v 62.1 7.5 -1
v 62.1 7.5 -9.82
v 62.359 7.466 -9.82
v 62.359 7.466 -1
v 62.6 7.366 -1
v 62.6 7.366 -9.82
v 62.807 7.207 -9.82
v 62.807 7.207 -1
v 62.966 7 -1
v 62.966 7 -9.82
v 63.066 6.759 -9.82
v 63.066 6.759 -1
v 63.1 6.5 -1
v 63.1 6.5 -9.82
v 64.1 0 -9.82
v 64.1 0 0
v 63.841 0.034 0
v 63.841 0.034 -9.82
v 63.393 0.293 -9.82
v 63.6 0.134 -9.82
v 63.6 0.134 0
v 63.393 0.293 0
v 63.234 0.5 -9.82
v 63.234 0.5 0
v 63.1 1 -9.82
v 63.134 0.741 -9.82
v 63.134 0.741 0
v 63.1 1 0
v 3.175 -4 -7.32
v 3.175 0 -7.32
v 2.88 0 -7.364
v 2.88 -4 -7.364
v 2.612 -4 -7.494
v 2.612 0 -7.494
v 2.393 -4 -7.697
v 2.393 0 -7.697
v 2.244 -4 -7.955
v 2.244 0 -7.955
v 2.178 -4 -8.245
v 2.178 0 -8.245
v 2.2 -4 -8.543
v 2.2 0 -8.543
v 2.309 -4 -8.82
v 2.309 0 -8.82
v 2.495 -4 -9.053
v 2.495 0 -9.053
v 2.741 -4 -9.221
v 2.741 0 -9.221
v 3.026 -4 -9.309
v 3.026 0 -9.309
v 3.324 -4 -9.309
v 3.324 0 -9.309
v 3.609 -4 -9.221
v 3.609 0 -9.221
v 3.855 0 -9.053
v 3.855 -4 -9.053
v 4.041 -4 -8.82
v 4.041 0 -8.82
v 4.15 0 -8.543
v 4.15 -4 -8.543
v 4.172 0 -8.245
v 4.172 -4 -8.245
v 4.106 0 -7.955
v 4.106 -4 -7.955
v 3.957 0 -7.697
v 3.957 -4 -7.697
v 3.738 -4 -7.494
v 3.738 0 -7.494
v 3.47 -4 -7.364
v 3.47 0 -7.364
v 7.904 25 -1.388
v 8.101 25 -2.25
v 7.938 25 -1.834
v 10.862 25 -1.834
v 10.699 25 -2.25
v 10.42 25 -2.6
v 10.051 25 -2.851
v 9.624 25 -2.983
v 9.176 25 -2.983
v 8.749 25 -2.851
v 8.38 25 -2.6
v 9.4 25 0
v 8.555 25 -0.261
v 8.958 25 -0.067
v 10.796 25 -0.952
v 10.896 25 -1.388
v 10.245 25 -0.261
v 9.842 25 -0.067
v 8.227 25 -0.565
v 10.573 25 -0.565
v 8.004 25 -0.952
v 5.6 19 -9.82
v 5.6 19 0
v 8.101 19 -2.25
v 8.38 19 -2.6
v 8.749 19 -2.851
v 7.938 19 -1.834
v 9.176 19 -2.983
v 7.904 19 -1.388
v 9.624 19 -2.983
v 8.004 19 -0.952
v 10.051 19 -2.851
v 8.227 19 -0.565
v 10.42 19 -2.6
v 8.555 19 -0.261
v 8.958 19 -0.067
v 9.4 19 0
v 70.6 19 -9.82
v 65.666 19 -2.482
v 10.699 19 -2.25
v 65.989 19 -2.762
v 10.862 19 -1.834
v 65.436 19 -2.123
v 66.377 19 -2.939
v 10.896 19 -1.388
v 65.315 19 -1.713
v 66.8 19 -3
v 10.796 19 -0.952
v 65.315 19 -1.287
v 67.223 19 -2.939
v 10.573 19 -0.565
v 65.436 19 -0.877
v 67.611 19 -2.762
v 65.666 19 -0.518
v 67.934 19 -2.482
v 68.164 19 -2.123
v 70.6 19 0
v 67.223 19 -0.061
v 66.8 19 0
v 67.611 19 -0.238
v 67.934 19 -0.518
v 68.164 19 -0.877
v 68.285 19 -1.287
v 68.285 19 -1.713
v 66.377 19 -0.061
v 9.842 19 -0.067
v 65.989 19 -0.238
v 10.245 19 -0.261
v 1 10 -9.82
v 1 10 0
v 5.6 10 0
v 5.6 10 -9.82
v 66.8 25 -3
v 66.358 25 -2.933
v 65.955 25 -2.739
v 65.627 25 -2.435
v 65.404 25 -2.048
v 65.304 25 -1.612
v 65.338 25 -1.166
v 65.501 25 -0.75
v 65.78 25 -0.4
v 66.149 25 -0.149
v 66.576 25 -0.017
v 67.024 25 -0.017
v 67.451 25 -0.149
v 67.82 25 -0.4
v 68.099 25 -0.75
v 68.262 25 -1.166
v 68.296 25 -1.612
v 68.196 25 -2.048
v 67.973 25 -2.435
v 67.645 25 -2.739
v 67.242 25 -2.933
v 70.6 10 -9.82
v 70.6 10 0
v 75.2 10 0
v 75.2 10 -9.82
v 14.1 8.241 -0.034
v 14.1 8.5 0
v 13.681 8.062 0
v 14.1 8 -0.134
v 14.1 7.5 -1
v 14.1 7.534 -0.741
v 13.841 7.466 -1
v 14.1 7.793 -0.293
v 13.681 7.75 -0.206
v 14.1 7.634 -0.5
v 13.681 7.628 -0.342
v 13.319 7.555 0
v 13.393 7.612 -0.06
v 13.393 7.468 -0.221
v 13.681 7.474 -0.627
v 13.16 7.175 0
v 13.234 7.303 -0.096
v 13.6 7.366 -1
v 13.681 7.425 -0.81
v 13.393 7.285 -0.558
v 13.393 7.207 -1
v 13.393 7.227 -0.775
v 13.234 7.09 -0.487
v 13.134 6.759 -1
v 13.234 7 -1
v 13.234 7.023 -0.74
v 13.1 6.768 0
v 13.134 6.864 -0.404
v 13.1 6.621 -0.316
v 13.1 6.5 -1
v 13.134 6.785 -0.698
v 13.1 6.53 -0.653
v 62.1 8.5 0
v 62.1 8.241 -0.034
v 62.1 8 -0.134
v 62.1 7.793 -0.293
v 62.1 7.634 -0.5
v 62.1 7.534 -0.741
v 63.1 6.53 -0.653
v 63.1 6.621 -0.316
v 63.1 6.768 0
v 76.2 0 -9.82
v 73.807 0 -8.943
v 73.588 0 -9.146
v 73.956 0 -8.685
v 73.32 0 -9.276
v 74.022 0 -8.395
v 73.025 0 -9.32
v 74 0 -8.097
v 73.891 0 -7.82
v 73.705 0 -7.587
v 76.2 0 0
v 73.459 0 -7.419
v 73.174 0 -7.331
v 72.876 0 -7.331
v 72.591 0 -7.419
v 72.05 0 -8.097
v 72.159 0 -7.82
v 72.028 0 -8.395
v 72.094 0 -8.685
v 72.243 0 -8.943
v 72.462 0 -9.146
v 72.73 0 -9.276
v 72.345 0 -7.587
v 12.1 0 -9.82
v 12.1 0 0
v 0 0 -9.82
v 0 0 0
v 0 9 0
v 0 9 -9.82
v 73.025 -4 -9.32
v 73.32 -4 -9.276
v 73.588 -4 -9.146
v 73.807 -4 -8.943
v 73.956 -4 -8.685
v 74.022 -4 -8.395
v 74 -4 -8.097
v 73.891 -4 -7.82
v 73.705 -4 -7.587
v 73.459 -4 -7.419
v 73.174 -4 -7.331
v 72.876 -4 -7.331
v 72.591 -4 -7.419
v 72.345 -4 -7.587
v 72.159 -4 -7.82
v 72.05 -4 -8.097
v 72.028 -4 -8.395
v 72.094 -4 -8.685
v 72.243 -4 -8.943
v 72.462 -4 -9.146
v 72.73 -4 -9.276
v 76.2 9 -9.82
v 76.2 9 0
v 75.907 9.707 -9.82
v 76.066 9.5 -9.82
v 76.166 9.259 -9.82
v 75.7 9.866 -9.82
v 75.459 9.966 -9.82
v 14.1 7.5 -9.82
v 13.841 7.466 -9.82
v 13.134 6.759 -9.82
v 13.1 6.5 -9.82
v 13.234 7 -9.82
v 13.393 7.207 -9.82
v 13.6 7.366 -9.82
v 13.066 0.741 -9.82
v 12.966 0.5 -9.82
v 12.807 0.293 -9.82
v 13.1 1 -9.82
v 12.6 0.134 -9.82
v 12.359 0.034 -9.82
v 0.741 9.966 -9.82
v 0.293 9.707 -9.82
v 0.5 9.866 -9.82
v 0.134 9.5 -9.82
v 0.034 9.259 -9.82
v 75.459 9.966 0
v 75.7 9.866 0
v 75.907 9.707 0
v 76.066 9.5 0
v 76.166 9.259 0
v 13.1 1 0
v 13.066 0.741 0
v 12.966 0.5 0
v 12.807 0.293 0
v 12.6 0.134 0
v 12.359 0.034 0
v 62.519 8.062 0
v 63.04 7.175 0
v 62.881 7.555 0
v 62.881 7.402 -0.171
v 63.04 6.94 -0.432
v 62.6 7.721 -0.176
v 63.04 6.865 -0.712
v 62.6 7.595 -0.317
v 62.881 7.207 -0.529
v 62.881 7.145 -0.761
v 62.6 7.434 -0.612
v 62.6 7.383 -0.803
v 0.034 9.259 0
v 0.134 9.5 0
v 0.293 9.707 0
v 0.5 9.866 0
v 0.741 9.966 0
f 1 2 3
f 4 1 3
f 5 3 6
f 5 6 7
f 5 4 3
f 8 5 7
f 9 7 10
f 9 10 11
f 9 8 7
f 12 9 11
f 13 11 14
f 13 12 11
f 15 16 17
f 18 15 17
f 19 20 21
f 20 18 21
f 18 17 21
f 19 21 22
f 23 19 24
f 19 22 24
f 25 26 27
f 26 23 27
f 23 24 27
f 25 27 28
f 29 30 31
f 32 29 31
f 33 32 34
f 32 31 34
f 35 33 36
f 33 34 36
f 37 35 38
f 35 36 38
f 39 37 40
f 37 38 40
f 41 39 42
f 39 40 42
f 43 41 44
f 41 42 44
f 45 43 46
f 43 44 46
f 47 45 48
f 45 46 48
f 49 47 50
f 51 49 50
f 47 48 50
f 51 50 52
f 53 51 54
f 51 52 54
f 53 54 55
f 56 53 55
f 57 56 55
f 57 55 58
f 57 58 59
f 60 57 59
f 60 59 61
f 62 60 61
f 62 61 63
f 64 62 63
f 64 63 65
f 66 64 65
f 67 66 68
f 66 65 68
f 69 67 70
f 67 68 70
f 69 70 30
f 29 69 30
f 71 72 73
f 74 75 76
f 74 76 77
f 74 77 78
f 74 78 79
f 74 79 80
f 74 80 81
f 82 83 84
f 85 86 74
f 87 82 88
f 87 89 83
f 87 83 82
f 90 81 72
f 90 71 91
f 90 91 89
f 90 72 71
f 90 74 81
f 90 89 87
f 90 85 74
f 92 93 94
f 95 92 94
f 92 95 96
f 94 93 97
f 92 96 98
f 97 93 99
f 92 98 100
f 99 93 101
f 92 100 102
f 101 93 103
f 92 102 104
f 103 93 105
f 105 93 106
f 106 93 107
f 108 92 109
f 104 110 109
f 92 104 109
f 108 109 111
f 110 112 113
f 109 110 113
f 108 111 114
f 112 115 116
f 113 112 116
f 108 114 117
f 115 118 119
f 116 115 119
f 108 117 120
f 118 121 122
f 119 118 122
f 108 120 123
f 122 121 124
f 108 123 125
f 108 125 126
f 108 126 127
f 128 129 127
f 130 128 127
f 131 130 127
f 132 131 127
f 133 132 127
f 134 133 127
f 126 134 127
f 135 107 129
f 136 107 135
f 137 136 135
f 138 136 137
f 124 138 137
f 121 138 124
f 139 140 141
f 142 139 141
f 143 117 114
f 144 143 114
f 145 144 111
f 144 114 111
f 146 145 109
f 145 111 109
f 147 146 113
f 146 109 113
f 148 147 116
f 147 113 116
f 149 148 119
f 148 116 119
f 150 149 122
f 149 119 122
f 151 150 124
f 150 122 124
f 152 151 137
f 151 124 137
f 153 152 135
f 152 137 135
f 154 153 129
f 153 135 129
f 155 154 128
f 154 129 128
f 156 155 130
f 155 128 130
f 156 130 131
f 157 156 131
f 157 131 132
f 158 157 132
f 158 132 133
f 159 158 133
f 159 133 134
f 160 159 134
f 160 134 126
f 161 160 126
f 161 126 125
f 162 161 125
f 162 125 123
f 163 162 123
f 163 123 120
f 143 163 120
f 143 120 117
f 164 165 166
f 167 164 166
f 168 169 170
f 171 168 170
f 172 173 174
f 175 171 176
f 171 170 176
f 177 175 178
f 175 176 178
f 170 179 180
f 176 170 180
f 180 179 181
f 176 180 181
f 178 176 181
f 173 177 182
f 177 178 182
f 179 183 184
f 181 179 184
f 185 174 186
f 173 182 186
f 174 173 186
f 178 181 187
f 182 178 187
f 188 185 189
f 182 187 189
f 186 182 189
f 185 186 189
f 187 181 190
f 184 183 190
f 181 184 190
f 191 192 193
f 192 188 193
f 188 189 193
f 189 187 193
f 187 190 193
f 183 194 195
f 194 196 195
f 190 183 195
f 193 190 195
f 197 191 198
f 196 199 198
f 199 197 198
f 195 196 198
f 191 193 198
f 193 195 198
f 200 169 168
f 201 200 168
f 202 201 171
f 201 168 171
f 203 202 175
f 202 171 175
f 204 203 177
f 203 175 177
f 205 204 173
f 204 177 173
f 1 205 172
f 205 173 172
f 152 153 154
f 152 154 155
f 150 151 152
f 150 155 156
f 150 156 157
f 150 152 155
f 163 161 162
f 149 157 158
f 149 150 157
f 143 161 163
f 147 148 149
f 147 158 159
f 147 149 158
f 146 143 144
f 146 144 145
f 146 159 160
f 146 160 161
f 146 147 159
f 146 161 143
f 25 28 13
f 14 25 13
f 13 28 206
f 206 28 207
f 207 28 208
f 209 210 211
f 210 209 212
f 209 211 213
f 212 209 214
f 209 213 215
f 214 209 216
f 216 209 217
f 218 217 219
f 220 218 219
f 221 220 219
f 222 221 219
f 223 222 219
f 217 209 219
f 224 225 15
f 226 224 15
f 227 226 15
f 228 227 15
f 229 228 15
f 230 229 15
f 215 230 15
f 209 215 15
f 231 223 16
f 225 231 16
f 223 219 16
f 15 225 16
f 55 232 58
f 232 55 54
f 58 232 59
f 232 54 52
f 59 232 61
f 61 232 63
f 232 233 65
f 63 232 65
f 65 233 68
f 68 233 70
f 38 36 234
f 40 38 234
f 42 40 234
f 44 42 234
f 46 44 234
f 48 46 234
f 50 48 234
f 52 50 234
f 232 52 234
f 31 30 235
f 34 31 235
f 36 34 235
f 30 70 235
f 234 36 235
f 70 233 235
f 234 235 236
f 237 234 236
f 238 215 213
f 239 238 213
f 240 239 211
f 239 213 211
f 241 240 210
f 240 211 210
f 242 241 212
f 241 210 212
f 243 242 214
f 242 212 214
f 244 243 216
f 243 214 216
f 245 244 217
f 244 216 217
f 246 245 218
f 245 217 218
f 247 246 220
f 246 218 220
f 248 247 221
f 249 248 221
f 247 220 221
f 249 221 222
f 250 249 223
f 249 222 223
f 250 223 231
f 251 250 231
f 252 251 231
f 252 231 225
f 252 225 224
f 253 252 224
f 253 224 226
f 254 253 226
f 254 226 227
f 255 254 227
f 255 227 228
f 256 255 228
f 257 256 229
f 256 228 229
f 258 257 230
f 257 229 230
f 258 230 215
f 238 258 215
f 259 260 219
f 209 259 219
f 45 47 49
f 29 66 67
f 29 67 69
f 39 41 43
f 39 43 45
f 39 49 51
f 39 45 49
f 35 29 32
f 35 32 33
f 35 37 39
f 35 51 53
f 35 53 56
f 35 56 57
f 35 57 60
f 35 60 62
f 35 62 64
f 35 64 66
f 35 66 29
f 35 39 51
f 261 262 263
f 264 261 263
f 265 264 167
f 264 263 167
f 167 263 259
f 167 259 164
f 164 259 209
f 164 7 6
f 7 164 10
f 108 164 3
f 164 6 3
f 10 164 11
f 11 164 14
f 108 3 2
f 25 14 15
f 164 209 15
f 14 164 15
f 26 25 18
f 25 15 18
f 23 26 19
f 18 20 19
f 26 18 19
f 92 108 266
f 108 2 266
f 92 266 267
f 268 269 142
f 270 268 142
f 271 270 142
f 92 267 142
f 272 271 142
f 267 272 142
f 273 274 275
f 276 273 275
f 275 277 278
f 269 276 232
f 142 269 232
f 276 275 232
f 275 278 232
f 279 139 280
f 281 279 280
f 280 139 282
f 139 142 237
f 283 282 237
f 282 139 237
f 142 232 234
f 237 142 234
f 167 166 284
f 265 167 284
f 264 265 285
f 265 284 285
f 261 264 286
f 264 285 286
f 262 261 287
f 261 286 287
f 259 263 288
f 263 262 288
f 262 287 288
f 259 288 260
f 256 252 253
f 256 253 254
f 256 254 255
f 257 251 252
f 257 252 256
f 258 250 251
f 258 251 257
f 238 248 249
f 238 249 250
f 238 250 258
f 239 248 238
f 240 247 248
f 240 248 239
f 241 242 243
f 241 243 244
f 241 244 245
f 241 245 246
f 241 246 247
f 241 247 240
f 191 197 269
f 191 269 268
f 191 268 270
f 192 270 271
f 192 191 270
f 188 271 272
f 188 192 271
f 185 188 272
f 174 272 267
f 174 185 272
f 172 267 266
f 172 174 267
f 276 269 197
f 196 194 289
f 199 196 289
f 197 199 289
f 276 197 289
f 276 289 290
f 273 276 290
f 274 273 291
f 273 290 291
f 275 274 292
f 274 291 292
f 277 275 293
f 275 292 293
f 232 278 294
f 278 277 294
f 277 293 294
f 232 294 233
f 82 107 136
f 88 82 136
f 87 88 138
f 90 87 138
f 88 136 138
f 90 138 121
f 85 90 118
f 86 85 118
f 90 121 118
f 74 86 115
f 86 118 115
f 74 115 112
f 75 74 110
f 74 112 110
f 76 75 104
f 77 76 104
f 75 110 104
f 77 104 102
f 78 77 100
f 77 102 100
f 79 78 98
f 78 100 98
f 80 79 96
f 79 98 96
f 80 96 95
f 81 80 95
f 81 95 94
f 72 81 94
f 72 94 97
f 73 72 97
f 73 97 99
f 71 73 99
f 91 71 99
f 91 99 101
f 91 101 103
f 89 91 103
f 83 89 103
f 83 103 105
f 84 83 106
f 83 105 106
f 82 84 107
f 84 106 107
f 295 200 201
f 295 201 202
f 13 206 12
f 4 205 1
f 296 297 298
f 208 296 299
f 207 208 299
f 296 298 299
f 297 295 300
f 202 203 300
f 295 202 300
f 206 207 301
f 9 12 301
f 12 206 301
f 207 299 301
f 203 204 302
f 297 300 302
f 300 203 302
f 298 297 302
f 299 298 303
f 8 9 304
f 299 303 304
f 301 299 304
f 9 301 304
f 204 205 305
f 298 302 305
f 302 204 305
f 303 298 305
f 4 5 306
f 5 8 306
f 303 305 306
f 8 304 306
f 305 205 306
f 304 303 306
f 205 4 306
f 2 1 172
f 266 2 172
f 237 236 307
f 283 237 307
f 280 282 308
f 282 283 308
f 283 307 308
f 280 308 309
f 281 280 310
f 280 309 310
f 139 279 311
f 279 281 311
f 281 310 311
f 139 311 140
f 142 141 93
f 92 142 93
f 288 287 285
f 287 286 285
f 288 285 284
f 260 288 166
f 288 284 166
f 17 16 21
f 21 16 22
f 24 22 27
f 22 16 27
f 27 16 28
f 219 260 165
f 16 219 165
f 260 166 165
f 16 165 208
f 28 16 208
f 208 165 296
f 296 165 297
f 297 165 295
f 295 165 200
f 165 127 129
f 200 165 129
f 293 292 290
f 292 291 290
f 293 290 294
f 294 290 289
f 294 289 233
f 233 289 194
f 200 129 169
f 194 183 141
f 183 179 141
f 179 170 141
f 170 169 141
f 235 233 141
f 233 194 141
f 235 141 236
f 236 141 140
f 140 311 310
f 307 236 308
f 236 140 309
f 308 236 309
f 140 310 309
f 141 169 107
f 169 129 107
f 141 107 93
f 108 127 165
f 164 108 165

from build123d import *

# Parameters (mm, degrees)
BOSS_EXTRUDE1_DEPTH = 9.82
SKETCH3_R           = 1.5
BOSS_EXTRUDE2_DEPTH = 6
SKETCH5_R           = 1
BOSS_EXTRUDE3_DEPTH = 4
FILLET1_R           = 1
FILLET3_R           = 1


with BuildPart() as part:
    # Sketch2 → Boss-Extrude1 (new body)
    with BuildSketch(Plane.XY):
        Polygon((0, 10), (5.6, 10), (5.6, 19), (70.6, 19), (70.6, 10), (76.2, 10), (76.2, 0), (63.1, 0), (63.1, 7.5), (13.1, 7.5), (13.1, 0), (0, 0), align=None)
    extrude(amount=-BOSS_EXTRUDE1_DEPTH)

    # Sketch3 → Boss-Extrude2 (add)
    with BuildSketch(Plane(origin=(0, 19, 0), x_dir=(1, 0, 0), z_dir=(0, 1, 0))):
        with Locations(Location((9.4, 1.5, 0), (0, 0, 270))):
            Circle(SKETCH3_R)
        with Locations(Location((66.8, 1.5, 0), (0, 0, 90))):
            Circle(SKETCH3_R)
    extrude(amount=BOSS_EXTRUDE2_DEPTH)

    # Sketch5 → Boss-Extrude3 (add)
    with BuildSketch(Plane.XZ):
        with Locations(Location((73.025, -8.32, 0), (0, 0, 270))):
            Circle(SKETCH5_R)
        with Locations(Location((3.175, -8.32, 0), (0, 0, 90))):
            Circle(SKETCH5_R)
    extrude(amount=BOSS_EXTRUDE3_DEPTH)

    # Fillet1
    fillet1_edges = [part.edges().sort_by_distance(p)[0] for p in [
        (38.1, 7.5, 0),
    ]]
    fillet(fillet1_edges, radius=FILLET1_R)

    # Fillet3
    # the kernel refuses this fillet: 1 mm, written as the material it adds along each edge
    with BuildSketch(Plane(origin=(63.1, 7.5, -1), x_dir=(-1, 0, 0), z_dir=(0, 0, -1))) as fillet3_piece_1:
        with BuildLine():
            CenterArc((FILLET3_R, -FILLET3_R), FILLET3_R, 90, 90)
            Line((0, -FILLET3_R), (0, 0))
            Line((0, 0), (FILLET3_R, 0))
        make_face()
    extrude(amount=8.82)
    with BuildSketch(Plane(origin=(13.1, 7.5, -1), x_dir=(1, 0, 0), z_dir=(0, 0, -1))) as fillet3_piece_2:
        with BuildLine():
            CenterArc((FILLET3_R, FILLET3_R), FILLET3_R, 180, 90)
            Line((0, FILLET3_R), (0, 0))
            Line((0, 0), (FILLET3_R, 0))
        make_face()
    extrude(amount=8.82)
    with BuildSketch(Plane(origin=(63.1, 8.5, -1), x_dir=(0, 0.5976672776328268, -0.8017442392976488), z_dir=(0, -0.8017442392976488, -0.5976672776328268))) as fillet3_piece_3_section:
        with BuildLine():
            CenterArc((1 + FILLET3_R, -FILLET3_R), FILLET3_R, 90, 90)
            Line((1 + FILLET3_R, 0), (1, 0))
            Line((1, 0), (1, -FILLET3_R))
        make_face()
    fillet3_piece_3 = revolve(axis=Axis((63.1, 8.5, -1), (1, 0, 0)), revolution_arc=233.296989237, mode=Mode.PRIVATE)
    fillet3_piece_3 = split(fillet3_piece_3, bisect_by=Plane(origin=(62.788371694, 7.750061053, 0), z_dir=(0, 0, -1)), keep=Keep.TOP, mode=Mode.PRIVATE)
    add(fillet3_piece_3)
    with BuildSketch(Plane(origin=(13.1, 8.5, -1), x_dir=(0, 0.5976672776328246, -0.8017442392976504), z_dir=(0, -0.8017442392976504, -0.5976672776328246))) as fillet3_piece_4_section:
        with BuildLine():
            CenterArc((1 + FILLET3_R, FILLET3_R), FILLET3_R, 180, 90)
            Line((1, FILLET3_R), (1, 0))
            Line((1, 0), (1 + FILLET3_R, 0))
        make_face()
    fillet3_piece_4 = revolve(axis=Axis((13.1, 8.5, -1), (1, 0, 0)), revolution_arc=233.296989237, mode=Mode.PRIVATE)
    fillet3_piece_4 = split(fillet3_piece_4, bisect_by=Plane(origin=(13.411628296, 7.750061029, 0), z_dir=(0, 0, -1)), keep=Keep.TOP, mode=Mode.PRIVATE)
    add(fillet3_piece_4)
    # the kernel refuses this fillet: 1 mm, written as the material it takes off along each edge
    with BuildSketch(Plane(origin=(63.1, 0, 2.5), x_dir=(0, 1, 0), z_dir=(0, 0, -1)), Plane(origin=(13.1, 0, 2.5), x_dir=(-1, 0, 0), z_dir=(0, 0, -1)), Plane(origin=(0, 10, 2.5), x_dir=(1, 0, 0), z_dir=(0, 0, -1)), Plane(origin=(76.2, 10, 2.5), x_dir=(0, -1, 0), z_dir=(0, 0, -1))) as fillet3_2_piece_1:
        with BuildLine():
            CenterArc((FILLET3_R, FILLET3_R), FILLET3_R, 180, 90)
            Line((0, FILLET3_R), (0, 0))
            Line((0, 0), (FILLET3_R, 0))
        make_face()
    extrude(amount=14.82, mode=Mode.SUBTRACT)


solid = part.part
